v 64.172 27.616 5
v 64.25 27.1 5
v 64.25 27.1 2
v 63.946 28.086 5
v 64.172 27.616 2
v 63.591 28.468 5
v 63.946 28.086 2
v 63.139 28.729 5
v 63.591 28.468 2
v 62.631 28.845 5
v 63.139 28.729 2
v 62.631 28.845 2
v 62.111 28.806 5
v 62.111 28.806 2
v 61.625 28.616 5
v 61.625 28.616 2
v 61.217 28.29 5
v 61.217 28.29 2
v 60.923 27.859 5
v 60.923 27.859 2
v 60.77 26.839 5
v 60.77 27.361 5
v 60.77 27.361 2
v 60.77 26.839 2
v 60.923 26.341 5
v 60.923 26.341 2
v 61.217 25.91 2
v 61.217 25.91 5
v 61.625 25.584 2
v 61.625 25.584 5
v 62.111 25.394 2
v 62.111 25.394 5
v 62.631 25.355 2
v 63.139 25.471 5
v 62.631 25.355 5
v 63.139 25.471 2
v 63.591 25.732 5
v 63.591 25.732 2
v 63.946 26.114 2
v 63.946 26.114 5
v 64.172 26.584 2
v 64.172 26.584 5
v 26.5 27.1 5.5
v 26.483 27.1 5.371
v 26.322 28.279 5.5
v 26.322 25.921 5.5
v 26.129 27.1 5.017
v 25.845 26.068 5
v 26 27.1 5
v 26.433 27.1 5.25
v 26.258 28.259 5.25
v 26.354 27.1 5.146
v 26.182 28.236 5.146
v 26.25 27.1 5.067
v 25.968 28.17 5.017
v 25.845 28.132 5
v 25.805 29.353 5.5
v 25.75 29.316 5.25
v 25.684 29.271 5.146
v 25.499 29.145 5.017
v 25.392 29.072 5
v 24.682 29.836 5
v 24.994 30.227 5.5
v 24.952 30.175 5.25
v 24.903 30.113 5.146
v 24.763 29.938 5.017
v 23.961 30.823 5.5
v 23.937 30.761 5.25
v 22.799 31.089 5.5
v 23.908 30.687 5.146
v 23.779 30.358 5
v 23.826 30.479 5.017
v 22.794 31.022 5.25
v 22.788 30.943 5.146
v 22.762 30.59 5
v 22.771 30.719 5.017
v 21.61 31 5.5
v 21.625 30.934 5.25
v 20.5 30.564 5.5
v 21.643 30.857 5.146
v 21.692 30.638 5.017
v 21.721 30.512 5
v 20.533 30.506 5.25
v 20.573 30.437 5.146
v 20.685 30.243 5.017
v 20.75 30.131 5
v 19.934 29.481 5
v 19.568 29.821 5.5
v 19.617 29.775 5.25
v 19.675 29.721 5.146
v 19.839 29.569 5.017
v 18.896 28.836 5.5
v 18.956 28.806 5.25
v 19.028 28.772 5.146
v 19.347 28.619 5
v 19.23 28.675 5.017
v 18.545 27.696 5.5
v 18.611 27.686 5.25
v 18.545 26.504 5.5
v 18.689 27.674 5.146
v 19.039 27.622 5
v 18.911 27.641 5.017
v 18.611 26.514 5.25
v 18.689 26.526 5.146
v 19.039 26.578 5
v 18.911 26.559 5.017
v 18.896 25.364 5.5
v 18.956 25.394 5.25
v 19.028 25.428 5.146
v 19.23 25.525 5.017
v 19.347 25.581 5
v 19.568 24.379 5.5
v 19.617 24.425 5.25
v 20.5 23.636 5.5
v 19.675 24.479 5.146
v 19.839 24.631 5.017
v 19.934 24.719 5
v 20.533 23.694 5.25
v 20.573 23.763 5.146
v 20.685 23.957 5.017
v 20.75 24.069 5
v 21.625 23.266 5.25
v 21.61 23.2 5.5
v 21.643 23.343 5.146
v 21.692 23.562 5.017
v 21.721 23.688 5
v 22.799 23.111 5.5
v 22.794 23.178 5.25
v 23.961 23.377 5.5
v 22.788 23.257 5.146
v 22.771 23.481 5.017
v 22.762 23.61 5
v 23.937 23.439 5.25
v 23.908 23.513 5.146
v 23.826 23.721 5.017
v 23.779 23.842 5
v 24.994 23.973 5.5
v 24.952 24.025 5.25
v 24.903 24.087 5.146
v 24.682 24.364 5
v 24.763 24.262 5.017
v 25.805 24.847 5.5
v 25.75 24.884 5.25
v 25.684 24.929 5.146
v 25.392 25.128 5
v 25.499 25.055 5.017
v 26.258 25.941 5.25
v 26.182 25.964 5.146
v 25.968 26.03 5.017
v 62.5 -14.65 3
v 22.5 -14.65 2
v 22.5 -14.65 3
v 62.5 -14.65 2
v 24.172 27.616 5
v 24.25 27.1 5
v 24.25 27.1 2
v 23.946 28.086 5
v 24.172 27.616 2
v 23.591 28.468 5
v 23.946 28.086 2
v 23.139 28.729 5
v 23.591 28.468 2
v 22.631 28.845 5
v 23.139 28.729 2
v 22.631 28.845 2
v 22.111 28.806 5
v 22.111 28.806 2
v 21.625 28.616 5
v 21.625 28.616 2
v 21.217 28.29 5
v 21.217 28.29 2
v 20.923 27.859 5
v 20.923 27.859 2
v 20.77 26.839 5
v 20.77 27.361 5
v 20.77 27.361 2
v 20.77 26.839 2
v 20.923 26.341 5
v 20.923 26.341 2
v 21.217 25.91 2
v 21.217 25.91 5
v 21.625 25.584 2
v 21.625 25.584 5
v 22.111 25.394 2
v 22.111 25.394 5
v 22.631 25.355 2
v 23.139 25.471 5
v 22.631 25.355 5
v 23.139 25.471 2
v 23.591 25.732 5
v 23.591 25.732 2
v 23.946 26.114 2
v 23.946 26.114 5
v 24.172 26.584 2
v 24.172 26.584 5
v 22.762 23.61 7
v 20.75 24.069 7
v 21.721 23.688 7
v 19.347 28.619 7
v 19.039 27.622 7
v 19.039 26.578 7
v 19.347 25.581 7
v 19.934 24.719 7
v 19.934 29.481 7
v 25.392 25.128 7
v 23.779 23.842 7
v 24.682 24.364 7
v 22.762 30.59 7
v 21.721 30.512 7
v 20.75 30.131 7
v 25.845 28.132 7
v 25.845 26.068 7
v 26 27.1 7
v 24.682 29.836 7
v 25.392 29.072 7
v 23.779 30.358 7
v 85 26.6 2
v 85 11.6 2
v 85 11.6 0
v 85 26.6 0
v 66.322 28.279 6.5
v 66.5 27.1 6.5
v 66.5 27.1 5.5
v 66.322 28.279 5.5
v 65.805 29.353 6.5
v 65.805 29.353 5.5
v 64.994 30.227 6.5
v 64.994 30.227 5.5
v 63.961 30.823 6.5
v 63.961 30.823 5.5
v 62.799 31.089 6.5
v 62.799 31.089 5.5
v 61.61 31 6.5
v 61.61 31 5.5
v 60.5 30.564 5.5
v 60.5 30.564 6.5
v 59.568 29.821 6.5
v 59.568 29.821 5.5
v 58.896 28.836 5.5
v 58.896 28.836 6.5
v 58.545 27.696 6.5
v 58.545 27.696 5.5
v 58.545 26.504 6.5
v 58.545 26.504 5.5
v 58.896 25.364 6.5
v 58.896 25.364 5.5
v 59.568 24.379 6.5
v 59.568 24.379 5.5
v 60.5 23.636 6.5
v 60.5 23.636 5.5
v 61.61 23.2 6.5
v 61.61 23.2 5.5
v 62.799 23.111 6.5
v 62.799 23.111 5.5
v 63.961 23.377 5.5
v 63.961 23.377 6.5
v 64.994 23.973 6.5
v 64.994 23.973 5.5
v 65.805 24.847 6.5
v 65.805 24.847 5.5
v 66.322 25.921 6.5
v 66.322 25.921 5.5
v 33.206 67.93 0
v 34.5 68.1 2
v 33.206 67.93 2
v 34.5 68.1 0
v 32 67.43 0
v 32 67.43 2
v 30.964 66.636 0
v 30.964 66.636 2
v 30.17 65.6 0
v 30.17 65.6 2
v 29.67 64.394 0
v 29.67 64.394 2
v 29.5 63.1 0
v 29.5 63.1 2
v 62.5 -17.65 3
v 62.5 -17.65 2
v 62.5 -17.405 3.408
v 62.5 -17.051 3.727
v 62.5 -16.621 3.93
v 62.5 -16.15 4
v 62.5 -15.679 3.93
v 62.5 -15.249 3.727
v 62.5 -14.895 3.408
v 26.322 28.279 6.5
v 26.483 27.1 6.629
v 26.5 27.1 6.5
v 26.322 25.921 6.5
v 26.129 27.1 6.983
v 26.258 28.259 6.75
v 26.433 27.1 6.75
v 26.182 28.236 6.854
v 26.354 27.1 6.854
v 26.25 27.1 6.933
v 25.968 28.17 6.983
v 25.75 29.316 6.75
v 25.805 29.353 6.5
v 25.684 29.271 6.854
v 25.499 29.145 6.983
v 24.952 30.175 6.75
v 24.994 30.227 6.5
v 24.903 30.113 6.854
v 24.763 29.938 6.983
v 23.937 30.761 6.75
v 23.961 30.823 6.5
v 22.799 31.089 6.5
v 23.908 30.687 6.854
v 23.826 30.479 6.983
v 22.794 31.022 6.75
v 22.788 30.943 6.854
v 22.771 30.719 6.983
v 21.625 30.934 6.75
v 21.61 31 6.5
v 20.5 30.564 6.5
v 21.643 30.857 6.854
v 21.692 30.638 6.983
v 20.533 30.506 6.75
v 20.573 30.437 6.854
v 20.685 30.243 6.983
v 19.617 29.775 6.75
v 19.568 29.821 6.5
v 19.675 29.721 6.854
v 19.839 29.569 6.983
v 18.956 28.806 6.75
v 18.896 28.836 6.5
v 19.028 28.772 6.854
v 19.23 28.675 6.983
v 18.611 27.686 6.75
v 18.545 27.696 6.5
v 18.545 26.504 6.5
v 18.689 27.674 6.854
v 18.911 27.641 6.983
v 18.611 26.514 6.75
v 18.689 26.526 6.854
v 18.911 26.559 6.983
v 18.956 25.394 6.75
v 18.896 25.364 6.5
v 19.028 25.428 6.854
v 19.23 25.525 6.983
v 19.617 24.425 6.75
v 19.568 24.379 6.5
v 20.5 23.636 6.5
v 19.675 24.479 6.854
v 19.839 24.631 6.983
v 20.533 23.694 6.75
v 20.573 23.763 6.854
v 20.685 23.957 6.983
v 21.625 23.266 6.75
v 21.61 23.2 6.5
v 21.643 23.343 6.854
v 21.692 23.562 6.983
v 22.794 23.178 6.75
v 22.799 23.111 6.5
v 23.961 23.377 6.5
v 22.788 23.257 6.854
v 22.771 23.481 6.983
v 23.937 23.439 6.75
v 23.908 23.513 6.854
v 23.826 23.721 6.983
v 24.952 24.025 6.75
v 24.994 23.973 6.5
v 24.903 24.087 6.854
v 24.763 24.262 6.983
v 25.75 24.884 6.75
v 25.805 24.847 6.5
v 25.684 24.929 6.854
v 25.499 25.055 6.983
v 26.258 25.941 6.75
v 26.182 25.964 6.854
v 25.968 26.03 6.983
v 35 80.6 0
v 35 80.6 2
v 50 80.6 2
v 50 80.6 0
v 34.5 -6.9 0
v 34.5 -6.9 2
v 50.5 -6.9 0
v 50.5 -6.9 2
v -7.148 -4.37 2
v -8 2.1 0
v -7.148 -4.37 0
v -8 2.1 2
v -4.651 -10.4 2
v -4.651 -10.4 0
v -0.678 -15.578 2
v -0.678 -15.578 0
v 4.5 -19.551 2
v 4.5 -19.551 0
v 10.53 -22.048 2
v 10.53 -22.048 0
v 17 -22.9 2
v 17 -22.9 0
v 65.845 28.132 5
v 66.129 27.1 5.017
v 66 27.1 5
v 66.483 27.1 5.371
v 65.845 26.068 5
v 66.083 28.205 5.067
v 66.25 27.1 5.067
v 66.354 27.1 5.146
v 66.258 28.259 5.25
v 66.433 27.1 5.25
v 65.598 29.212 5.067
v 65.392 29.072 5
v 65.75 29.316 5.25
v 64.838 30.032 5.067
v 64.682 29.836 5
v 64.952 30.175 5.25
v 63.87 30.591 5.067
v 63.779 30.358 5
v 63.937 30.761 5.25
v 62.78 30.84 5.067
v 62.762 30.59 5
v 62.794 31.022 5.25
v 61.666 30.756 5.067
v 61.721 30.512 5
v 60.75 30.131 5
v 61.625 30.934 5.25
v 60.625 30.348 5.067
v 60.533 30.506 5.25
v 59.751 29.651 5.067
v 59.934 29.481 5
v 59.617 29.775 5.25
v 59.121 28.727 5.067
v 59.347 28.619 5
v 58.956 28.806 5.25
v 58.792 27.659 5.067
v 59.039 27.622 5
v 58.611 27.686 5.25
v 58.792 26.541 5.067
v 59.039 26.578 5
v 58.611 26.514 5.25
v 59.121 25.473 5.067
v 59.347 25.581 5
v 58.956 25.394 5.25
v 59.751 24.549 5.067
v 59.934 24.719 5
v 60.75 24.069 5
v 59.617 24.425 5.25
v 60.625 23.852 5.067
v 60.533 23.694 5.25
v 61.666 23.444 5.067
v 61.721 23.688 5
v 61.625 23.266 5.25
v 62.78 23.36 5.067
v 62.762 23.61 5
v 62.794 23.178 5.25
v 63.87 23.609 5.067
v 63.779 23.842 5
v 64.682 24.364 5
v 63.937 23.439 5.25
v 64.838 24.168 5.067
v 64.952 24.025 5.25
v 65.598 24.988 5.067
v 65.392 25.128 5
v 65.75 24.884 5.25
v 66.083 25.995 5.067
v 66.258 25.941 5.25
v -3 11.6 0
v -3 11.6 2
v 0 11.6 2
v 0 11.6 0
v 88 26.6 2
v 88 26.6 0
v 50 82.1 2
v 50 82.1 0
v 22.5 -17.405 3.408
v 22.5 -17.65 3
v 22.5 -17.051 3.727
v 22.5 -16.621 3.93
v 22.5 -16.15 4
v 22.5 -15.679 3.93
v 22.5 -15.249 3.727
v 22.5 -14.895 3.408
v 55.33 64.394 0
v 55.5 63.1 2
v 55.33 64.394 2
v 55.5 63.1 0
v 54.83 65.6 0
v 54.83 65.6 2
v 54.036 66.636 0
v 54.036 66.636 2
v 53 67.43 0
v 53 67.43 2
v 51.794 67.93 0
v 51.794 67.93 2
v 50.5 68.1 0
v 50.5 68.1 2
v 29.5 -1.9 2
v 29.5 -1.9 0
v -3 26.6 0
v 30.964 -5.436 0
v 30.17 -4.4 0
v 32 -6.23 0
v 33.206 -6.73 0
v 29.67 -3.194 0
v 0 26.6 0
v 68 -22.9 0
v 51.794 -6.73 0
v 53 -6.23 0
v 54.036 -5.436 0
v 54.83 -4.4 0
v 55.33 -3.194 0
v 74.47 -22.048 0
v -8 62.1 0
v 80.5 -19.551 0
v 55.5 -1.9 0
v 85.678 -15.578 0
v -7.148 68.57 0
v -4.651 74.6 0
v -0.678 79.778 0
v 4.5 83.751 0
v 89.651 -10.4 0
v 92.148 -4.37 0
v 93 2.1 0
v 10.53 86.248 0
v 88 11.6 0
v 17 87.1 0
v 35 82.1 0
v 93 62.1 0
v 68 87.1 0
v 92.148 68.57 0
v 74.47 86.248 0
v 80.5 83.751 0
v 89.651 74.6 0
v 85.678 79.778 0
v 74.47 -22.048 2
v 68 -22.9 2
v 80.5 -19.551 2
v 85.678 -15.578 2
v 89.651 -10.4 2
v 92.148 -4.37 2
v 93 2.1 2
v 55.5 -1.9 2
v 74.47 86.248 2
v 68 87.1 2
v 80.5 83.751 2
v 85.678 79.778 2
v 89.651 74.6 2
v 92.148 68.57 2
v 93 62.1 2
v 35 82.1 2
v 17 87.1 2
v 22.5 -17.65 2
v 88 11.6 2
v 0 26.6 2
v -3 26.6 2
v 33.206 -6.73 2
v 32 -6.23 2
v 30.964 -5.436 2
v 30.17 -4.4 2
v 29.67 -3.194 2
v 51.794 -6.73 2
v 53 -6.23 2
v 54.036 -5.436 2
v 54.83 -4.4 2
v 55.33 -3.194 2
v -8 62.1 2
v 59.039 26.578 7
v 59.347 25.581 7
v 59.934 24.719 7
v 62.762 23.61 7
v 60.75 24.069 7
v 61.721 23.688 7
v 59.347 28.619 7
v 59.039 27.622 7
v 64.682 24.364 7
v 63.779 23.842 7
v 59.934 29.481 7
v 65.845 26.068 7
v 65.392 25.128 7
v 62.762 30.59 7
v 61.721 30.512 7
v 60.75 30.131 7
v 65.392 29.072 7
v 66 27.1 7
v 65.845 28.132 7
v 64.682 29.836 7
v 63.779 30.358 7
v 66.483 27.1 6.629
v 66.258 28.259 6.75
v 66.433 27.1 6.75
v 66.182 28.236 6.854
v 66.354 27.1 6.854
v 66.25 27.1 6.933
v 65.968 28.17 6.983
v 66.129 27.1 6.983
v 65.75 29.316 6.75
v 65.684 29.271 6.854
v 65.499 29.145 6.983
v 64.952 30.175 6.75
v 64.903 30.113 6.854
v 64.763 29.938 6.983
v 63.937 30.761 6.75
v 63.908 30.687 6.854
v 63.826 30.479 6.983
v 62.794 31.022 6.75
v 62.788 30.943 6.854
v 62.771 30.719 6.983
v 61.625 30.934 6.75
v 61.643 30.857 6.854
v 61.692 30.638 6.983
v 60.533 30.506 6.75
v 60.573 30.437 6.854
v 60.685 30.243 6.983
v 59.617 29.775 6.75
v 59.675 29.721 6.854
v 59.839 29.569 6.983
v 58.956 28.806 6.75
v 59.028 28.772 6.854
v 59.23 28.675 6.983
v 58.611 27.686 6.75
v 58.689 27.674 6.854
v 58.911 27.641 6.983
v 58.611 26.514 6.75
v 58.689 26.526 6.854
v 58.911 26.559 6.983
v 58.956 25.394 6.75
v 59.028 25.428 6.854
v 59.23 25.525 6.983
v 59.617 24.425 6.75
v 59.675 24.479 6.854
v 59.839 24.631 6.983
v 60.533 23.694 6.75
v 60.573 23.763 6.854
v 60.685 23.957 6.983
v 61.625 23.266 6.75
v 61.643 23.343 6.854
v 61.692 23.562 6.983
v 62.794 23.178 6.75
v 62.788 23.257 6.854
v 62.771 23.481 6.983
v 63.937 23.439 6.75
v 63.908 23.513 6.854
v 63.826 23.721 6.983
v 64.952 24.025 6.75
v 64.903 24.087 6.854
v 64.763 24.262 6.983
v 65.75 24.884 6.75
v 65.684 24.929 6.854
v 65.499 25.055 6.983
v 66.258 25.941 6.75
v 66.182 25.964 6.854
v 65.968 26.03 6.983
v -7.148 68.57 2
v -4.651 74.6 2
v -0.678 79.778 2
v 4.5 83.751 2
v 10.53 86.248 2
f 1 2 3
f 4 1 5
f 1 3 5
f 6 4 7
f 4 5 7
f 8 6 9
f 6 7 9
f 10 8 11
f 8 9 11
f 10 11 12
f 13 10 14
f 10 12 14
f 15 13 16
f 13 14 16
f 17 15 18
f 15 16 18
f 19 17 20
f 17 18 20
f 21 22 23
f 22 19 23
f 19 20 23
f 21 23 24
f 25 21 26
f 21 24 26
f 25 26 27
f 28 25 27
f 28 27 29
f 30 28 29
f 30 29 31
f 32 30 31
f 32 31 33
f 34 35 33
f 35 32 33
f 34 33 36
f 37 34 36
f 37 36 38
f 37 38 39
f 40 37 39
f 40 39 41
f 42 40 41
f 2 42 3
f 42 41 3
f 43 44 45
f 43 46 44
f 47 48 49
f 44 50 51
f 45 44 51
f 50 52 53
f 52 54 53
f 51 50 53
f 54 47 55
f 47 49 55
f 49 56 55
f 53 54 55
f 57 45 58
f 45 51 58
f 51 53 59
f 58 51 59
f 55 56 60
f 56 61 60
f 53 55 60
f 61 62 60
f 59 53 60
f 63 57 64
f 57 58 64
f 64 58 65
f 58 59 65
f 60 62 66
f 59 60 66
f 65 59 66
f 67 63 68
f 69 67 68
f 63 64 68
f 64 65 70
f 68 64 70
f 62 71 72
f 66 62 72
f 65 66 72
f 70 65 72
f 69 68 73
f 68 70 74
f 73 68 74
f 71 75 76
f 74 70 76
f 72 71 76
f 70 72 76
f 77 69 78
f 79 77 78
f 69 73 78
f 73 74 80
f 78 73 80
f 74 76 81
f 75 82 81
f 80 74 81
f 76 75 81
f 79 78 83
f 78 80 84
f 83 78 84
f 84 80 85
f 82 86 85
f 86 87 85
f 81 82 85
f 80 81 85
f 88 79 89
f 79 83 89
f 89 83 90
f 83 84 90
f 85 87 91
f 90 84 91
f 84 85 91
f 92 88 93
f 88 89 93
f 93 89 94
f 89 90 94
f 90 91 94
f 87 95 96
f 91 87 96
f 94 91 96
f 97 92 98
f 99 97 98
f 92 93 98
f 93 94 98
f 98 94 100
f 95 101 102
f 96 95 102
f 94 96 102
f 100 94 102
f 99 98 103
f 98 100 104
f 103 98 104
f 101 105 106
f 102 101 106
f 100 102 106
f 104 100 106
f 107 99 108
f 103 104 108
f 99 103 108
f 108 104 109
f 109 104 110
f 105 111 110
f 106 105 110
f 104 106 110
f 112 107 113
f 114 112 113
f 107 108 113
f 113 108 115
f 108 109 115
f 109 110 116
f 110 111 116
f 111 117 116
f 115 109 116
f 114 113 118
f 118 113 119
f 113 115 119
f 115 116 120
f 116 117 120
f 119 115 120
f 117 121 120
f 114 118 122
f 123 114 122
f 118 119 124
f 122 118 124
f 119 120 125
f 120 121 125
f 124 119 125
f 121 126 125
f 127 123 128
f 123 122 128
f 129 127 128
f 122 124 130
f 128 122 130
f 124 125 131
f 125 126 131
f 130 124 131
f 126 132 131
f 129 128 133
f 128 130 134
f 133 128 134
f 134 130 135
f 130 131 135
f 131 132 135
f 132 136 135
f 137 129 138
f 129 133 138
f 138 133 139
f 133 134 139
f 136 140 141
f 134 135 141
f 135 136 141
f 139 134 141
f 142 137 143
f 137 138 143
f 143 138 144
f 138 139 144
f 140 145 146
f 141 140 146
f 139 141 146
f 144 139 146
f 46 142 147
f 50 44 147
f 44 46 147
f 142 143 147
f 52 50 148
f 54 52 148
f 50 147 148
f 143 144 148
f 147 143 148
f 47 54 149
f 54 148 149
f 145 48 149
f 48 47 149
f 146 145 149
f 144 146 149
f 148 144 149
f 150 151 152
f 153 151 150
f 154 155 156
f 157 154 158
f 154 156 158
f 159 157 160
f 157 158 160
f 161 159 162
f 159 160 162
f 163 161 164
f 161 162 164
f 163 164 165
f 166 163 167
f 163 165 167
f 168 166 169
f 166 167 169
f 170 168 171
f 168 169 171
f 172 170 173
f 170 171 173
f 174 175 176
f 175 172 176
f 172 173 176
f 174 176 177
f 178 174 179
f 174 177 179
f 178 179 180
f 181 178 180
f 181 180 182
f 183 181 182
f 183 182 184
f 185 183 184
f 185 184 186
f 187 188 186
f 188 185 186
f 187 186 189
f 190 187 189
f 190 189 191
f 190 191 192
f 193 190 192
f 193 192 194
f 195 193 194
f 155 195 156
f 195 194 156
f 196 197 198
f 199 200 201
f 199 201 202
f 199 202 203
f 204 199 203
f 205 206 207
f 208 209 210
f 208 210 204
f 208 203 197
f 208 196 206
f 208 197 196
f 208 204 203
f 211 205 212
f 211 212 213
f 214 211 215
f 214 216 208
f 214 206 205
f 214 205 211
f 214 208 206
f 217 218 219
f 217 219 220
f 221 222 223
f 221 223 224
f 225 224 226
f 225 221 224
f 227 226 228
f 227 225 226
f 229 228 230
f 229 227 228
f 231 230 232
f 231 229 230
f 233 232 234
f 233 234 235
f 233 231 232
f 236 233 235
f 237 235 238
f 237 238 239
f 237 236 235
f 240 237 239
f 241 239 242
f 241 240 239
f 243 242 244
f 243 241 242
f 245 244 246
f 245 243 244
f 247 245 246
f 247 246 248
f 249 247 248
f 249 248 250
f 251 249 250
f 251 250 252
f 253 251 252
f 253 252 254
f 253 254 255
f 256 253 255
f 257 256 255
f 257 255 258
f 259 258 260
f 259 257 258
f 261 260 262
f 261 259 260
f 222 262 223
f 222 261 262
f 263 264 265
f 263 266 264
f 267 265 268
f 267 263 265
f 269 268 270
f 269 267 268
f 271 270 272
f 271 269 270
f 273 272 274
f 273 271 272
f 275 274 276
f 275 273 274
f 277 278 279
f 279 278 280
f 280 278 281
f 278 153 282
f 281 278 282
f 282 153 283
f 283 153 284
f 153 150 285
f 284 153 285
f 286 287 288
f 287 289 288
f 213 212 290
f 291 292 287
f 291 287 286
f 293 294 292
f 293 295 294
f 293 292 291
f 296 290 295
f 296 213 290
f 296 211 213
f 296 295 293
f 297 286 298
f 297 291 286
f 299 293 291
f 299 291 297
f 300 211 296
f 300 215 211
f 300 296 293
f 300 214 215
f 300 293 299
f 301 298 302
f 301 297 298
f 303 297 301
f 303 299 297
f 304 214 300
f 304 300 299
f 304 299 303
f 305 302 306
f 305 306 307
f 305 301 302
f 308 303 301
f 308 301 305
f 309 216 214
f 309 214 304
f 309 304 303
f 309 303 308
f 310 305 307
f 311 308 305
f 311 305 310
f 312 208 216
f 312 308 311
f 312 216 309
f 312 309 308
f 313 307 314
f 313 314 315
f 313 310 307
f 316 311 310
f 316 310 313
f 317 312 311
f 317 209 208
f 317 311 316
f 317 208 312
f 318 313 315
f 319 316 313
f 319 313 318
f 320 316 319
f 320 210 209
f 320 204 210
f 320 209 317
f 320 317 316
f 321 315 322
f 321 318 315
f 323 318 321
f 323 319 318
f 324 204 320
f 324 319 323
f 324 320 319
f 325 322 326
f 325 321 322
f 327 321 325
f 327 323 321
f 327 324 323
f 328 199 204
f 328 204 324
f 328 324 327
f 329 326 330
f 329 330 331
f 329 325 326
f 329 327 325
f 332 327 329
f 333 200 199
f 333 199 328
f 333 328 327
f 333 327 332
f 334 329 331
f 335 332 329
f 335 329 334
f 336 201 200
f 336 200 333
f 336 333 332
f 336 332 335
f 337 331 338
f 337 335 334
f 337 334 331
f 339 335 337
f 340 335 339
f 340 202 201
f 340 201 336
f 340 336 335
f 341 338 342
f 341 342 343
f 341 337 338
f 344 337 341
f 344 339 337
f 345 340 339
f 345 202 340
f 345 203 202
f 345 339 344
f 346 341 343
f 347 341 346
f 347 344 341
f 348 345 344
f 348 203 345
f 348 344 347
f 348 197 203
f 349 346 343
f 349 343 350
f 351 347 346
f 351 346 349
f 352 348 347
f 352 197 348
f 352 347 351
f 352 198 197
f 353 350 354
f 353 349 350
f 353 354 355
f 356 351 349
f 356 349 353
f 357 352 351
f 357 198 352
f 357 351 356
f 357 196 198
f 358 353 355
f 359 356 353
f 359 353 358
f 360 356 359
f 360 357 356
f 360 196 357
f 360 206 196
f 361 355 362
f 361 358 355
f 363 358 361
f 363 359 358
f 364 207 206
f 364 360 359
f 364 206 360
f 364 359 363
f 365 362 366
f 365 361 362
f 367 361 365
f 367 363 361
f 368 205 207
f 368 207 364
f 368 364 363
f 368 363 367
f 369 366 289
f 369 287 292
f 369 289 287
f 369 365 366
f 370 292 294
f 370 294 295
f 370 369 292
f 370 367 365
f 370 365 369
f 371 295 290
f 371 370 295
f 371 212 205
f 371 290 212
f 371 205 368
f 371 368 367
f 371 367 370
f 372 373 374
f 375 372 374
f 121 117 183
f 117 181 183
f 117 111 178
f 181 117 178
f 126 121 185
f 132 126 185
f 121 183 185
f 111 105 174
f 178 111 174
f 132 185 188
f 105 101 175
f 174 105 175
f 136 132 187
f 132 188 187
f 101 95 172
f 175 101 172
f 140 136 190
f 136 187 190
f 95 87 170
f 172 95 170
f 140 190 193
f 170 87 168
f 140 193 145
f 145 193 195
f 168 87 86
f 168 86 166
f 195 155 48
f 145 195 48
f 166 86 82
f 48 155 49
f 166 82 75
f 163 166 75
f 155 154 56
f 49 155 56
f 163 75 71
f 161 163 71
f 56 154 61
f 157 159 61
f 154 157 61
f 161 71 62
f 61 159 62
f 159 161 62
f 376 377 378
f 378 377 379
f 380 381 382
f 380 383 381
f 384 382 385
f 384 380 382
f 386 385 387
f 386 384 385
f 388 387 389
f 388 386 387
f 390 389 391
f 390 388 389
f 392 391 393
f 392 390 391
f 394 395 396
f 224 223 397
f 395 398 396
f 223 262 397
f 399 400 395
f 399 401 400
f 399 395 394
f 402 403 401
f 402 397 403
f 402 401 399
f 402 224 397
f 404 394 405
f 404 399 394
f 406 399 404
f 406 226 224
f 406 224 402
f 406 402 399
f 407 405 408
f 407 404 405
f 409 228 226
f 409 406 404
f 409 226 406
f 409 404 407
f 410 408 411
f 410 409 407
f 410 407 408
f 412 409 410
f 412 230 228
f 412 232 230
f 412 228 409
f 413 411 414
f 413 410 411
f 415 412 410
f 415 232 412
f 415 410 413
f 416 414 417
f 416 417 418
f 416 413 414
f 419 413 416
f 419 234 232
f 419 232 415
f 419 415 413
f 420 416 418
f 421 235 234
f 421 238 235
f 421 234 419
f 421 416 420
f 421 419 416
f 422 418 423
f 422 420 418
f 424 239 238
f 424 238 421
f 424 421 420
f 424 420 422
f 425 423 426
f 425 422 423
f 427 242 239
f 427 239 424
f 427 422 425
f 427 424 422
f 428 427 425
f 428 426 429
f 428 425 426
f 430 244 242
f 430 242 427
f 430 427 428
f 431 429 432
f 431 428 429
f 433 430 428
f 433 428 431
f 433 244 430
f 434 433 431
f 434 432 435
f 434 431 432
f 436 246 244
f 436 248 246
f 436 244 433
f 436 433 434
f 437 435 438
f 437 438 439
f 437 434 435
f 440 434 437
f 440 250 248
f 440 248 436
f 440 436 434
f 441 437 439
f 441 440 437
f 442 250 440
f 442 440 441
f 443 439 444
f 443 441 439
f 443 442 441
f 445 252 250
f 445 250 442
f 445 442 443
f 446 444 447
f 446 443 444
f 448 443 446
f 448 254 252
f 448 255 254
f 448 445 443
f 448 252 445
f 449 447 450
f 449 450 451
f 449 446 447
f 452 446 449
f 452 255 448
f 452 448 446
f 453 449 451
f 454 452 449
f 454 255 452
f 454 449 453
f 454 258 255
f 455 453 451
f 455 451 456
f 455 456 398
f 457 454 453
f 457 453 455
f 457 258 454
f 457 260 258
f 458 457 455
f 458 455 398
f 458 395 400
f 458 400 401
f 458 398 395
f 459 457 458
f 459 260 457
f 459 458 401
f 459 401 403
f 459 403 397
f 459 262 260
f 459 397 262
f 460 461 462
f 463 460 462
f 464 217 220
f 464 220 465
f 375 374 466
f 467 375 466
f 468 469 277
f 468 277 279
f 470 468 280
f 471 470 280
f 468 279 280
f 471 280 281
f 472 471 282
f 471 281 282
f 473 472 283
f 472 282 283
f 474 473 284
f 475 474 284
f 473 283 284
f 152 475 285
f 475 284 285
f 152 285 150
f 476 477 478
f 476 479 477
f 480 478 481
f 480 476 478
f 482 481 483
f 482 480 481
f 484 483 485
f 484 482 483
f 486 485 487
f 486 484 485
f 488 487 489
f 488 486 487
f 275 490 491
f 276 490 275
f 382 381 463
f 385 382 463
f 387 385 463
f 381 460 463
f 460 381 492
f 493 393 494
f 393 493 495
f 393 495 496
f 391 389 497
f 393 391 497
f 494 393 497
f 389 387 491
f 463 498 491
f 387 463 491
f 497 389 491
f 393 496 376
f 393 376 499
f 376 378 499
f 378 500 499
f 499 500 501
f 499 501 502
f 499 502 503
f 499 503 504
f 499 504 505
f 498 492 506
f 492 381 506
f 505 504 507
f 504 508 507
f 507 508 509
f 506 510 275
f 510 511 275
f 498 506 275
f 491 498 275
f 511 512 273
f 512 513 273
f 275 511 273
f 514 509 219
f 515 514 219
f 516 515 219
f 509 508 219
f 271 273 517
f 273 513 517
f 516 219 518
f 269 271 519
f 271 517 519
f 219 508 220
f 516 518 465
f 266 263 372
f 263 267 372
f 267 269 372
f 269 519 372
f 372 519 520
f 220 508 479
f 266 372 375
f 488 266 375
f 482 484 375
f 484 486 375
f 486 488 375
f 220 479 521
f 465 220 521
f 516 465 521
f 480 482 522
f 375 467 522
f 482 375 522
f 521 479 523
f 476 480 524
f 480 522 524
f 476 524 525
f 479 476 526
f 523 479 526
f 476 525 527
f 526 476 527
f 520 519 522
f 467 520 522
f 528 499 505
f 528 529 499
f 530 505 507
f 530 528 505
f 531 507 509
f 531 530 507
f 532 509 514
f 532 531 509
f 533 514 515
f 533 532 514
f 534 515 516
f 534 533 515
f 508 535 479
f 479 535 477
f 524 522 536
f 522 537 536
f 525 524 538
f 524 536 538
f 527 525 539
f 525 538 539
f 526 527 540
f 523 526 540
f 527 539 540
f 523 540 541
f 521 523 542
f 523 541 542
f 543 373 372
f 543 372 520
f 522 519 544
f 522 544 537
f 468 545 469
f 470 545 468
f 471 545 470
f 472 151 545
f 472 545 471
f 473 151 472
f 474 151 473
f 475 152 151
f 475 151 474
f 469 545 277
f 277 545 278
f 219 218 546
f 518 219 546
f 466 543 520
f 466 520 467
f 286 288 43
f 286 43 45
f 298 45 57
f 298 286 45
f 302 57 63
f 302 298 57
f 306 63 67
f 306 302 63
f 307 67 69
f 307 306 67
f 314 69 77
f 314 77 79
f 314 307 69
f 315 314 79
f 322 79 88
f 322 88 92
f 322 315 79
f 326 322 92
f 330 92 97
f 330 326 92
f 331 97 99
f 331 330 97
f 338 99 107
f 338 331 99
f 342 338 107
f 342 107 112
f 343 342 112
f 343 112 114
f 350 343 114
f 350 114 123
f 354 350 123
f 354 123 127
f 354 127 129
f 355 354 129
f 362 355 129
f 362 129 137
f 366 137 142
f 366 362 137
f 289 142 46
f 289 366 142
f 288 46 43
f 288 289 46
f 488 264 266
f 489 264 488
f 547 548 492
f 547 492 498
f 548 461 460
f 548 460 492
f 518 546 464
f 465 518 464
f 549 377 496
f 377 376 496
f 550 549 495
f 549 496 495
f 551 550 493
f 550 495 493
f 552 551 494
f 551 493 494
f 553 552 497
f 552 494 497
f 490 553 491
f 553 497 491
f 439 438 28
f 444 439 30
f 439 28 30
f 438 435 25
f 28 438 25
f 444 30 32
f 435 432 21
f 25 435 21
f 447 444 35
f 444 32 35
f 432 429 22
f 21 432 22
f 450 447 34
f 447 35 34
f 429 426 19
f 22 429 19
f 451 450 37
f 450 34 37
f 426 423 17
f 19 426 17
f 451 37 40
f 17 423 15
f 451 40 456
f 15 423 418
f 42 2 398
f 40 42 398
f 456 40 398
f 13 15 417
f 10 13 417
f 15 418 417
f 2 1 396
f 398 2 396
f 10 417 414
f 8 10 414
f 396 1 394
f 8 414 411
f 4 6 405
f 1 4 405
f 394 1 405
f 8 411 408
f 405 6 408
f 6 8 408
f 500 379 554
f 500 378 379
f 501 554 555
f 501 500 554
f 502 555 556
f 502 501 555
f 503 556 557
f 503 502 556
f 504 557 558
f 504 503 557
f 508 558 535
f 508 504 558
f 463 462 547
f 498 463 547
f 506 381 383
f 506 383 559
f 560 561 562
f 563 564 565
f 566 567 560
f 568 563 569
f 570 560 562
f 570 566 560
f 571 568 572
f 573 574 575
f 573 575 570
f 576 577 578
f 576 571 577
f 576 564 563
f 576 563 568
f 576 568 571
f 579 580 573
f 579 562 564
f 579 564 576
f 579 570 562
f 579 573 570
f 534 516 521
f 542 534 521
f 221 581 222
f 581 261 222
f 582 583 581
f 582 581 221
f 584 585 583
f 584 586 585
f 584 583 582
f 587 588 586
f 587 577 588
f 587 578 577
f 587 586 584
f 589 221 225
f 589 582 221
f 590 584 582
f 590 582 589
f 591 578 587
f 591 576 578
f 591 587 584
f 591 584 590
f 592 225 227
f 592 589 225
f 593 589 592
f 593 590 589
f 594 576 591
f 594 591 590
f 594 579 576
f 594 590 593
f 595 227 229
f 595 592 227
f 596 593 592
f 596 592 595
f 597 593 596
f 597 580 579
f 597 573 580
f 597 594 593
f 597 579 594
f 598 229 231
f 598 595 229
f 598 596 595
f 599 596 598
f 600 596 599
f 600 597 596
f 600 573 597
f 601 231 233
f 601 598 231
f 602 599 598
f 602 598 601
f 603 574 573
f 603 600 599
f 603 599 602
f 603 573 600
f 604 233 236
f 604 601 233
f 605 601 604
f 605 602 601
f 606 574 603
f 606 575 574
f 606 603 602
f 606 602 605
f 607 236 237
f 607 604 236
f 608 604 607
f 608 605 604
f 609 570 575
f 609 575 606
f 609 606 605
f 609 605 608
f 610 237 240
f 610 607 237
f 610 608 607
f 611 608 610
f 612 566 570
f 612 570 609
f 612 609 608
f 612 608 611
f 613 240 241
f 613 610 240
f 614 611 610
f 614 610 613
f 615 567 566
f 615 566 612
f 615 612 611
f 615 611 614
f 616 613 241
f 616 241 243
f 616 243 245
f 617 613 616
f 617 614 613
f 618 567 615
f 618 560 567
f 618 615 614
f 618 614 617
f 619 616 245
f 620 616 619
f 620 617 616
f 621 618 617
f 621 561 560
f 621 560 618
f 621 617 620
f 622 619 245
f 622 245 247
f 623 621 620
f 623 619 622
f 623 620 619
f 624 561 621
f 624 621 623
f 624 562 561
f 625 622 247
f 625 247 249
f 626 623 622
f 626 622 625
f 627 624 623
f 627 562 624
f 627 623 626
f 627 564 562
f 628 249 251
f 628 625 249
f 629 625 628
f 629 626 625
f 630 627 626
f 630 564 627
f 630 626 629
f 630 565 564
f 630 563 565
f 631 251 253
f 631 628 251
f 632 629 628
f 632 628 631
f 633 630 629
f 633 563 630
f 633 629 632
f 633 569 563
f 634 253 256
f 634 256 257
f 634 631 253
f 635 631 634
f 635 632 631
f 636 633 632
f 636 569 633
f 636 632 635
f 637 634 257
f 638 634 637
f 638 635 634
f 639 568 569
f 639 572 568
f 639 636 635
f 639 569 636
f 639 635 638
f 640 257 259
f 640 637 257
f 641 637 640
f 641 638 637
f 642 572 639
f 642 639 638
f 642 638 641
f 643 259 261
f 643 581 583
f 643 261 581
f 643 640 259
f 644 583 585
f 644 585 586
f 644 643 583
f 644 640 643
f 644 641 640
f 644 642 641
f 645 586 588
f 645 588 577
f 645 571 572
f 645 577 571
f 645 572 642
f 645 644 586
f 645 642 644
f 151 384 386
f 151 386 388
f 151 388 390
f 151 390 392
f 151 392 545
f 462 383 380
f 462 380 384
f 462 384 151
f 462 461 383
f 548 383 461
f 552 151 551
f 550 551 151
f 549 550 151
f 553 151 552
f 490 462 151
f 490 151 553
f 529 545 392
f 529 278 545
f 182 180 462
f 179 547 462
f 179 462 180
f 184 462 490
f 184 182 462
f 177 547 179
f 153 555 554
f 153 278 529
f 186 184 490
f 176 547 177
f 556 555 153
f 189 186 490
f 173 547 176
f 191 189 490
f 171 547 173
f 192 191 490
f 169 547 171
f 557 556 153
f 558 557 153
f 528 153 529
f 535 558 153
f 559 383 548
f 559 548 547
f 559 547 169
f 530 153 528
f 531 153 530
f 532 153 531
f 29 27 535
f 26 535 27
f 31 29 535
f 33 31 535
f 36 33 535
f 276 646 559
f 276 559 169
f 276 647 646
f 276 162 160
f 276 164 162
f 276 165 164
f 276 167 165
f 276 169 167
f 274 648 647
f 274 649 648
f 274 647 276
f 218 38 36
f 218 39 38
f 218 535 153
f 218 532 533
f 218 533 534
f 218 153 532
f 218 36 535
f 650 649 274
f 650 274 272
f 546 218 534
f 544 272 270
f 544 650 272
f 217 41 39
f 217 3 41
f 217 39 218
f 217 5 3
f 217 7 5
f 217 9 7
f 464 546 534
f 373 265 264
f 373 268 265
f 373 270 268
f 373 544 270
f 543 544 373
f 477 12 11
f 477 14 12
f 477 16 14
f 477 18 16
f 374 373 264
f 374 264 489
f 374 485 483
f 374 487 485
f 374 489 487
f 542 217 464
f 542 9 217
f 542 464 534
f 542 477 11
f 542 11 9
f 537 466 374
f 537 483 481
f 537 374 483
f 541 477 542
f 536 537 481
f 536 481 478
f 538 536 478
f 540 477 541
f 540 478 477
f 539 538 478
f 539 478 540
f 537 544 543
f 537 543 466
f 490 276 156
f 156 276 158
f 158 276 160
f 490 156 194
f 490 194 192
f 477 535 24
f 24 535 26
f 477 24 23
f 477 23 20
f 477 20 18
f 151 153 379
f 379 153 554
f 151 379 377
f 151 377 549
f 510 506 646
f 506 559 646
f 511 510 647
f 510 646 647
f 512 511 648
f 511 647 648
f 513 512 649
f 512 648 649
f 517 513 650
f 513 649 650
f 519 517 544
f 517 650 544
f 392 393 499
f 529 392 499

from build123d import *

# Parameters (mm, degrees)
SKETCH1_W           = 101
SKETCH1_H           = 110
BOSS_EXTRUDE1_DEPTH = 2
SKETCH3_W           = 15
SKETCH3_H           = 1.5
SKETCH3_W_2         = 3
SKETCH3_H_2         = 15
CUT_EXTRUDE1_DEPTH  = 128.433943673
SKETCH4_R           = 1.75
BOSS_EXTRUDE2_DEPTH = 5
SKETCH5_R           = 4
BOSS_EXTRUDE3_DEPTH = 2
FILLET1_R           = 0.5
FILLET2_R           = 25
SKETCH6_W           = 40
SKETCH6_H           = 3
BOSS_EXTRUDE4_DEPTH = 1
BOSS_EXTRUDE5_DEPTH = 40
SKETCH9_W           = 26
SKETCH9_H           = 75
CUT_EXTRUDE2_DEPTH  = 128.516312682
FILLET3_R           = 5


with BuildPart() as part:
    # Sketch1 → Boss-Extrude1 (new body)
    with BuildSketch(Plane.XY):
        with Locations((42.5, 32.1)):
            Rectangle(SKETCH1_W, SKETCH1_H)
    extrude(amount=BOSS_EXTRUDE1_DEPTH)

    # Sketch3 → Cut-Extrude1 (cut, through all)
    with BuildSketch(Plane.XY.offset(2)):
        with Locations((42.5, 81.35)):
            Rectangle(SKETCH3_W, SKETCH3_H)
        with Locations((-1.5, 19.1)):
            Rectangle(SKETCH3_W_2, SKETCH3_H_2)
        with Locations((86.5, 19.1)):
            Rectangle(SKETCH3_W_2, SKETCH3_H_2)
    extrude(amount=-CUT_EXTRUDE1_DEPTH, mode=Mode.SUBTRACT)

    # Sketch4 → Boss-Extrude2 (add)
    with BuildSketch(Plane.XY.offset(2)):
        with Locations((22.5, 27.1)):
            Circle(SKETCH4_R)
        with Locations((62.5, 27.1)):
            Circle(SKETCH4_R)
    extrude(amount=BOSS_EXTRUDE2_DEPTH)

    # Sketch5 → Boss-Extrude3 (add)
    with BuildSketch(Plane.XY.offset(7)):
        with Locations((22.5, 27.1)):
            Circle(SKETCH5_R)
        with Locations((62.5, 27.1)):
            Circle(SKETCH5_R)
    extrude(amount=-BOSS_EXTRUDE3_DEPTH)

    # Fillet1
    fillet1_edges = [part.edges().sort_by_distance(p)[0] for p in [
        (18.5, 27.1, 5),
        (18.5, 27.1, 7),
        (58.5, 27.1, 5),
        (58.5, 27.1, 7),
    ]]
    fillet(fillet1_edges, radius=FILLET1_R)

    # Fillet2
    fillet2_edges = [part.edges().sort_by_distance(p)[0] for p in [
        (-8, 87.1, 1),
        (93, 87.1, 1),
        (93, -22.9, 1),
        (-8, -22.9, 1),
    ]]
    fillet(fillet2_edges, radius=FILLET2_R)

    # Sketch6 → Boss-Extrude4 (add)
    with BuildSketch(Plane.XY.offset(2)):
        with Locations((42.5, -16.15)):
            Rectangle(SKETCH6_W, SKETCH6_H)
    extrude(amount=BOSS_EXTRUDE4_DEPTH)

    # Sketch7 → Boss-Extrude5 (add)
    with BuildSketch(Plane(origin=(62.5, 0, 0), x_dir=(0, 0, -1), z_dir=(1, 0, 0))):
        with BuildLine():
            Line((-3, -14.65), (-3, -17.65))
            ThreePointArc((-3, -17.65), (-4, -16.15), (-3, -14.65))
        make_face()
    extrude(amount=-BOSS_EXTRUDE5_DEPTH)

    # Sketch9 → Cut-Extrude2 (cut, through all)
    with BuildSketch(Plane.XY.offset(2)):
        with Locations((42.5, 30.6)):
            Rectangle(SKETCH9_W, SKETCH9_H)
    extrude(amount=-CUT_EXTRUDE2_DEPTH, mode=Mode.SUBTRACT)

    # Fillet3
    fillet3_edges = [part.edges().sort_by_distance(p)[0] for p in [
        (29.5, -6.9, 1),
        (29.5, 68.1, 1),
        (55.5, 68.1, 1),
        (55.5, -6.9, 1),
    ]]
    fillet(fillet3_edges, radius=FILLET3_R)


solid = part.part
